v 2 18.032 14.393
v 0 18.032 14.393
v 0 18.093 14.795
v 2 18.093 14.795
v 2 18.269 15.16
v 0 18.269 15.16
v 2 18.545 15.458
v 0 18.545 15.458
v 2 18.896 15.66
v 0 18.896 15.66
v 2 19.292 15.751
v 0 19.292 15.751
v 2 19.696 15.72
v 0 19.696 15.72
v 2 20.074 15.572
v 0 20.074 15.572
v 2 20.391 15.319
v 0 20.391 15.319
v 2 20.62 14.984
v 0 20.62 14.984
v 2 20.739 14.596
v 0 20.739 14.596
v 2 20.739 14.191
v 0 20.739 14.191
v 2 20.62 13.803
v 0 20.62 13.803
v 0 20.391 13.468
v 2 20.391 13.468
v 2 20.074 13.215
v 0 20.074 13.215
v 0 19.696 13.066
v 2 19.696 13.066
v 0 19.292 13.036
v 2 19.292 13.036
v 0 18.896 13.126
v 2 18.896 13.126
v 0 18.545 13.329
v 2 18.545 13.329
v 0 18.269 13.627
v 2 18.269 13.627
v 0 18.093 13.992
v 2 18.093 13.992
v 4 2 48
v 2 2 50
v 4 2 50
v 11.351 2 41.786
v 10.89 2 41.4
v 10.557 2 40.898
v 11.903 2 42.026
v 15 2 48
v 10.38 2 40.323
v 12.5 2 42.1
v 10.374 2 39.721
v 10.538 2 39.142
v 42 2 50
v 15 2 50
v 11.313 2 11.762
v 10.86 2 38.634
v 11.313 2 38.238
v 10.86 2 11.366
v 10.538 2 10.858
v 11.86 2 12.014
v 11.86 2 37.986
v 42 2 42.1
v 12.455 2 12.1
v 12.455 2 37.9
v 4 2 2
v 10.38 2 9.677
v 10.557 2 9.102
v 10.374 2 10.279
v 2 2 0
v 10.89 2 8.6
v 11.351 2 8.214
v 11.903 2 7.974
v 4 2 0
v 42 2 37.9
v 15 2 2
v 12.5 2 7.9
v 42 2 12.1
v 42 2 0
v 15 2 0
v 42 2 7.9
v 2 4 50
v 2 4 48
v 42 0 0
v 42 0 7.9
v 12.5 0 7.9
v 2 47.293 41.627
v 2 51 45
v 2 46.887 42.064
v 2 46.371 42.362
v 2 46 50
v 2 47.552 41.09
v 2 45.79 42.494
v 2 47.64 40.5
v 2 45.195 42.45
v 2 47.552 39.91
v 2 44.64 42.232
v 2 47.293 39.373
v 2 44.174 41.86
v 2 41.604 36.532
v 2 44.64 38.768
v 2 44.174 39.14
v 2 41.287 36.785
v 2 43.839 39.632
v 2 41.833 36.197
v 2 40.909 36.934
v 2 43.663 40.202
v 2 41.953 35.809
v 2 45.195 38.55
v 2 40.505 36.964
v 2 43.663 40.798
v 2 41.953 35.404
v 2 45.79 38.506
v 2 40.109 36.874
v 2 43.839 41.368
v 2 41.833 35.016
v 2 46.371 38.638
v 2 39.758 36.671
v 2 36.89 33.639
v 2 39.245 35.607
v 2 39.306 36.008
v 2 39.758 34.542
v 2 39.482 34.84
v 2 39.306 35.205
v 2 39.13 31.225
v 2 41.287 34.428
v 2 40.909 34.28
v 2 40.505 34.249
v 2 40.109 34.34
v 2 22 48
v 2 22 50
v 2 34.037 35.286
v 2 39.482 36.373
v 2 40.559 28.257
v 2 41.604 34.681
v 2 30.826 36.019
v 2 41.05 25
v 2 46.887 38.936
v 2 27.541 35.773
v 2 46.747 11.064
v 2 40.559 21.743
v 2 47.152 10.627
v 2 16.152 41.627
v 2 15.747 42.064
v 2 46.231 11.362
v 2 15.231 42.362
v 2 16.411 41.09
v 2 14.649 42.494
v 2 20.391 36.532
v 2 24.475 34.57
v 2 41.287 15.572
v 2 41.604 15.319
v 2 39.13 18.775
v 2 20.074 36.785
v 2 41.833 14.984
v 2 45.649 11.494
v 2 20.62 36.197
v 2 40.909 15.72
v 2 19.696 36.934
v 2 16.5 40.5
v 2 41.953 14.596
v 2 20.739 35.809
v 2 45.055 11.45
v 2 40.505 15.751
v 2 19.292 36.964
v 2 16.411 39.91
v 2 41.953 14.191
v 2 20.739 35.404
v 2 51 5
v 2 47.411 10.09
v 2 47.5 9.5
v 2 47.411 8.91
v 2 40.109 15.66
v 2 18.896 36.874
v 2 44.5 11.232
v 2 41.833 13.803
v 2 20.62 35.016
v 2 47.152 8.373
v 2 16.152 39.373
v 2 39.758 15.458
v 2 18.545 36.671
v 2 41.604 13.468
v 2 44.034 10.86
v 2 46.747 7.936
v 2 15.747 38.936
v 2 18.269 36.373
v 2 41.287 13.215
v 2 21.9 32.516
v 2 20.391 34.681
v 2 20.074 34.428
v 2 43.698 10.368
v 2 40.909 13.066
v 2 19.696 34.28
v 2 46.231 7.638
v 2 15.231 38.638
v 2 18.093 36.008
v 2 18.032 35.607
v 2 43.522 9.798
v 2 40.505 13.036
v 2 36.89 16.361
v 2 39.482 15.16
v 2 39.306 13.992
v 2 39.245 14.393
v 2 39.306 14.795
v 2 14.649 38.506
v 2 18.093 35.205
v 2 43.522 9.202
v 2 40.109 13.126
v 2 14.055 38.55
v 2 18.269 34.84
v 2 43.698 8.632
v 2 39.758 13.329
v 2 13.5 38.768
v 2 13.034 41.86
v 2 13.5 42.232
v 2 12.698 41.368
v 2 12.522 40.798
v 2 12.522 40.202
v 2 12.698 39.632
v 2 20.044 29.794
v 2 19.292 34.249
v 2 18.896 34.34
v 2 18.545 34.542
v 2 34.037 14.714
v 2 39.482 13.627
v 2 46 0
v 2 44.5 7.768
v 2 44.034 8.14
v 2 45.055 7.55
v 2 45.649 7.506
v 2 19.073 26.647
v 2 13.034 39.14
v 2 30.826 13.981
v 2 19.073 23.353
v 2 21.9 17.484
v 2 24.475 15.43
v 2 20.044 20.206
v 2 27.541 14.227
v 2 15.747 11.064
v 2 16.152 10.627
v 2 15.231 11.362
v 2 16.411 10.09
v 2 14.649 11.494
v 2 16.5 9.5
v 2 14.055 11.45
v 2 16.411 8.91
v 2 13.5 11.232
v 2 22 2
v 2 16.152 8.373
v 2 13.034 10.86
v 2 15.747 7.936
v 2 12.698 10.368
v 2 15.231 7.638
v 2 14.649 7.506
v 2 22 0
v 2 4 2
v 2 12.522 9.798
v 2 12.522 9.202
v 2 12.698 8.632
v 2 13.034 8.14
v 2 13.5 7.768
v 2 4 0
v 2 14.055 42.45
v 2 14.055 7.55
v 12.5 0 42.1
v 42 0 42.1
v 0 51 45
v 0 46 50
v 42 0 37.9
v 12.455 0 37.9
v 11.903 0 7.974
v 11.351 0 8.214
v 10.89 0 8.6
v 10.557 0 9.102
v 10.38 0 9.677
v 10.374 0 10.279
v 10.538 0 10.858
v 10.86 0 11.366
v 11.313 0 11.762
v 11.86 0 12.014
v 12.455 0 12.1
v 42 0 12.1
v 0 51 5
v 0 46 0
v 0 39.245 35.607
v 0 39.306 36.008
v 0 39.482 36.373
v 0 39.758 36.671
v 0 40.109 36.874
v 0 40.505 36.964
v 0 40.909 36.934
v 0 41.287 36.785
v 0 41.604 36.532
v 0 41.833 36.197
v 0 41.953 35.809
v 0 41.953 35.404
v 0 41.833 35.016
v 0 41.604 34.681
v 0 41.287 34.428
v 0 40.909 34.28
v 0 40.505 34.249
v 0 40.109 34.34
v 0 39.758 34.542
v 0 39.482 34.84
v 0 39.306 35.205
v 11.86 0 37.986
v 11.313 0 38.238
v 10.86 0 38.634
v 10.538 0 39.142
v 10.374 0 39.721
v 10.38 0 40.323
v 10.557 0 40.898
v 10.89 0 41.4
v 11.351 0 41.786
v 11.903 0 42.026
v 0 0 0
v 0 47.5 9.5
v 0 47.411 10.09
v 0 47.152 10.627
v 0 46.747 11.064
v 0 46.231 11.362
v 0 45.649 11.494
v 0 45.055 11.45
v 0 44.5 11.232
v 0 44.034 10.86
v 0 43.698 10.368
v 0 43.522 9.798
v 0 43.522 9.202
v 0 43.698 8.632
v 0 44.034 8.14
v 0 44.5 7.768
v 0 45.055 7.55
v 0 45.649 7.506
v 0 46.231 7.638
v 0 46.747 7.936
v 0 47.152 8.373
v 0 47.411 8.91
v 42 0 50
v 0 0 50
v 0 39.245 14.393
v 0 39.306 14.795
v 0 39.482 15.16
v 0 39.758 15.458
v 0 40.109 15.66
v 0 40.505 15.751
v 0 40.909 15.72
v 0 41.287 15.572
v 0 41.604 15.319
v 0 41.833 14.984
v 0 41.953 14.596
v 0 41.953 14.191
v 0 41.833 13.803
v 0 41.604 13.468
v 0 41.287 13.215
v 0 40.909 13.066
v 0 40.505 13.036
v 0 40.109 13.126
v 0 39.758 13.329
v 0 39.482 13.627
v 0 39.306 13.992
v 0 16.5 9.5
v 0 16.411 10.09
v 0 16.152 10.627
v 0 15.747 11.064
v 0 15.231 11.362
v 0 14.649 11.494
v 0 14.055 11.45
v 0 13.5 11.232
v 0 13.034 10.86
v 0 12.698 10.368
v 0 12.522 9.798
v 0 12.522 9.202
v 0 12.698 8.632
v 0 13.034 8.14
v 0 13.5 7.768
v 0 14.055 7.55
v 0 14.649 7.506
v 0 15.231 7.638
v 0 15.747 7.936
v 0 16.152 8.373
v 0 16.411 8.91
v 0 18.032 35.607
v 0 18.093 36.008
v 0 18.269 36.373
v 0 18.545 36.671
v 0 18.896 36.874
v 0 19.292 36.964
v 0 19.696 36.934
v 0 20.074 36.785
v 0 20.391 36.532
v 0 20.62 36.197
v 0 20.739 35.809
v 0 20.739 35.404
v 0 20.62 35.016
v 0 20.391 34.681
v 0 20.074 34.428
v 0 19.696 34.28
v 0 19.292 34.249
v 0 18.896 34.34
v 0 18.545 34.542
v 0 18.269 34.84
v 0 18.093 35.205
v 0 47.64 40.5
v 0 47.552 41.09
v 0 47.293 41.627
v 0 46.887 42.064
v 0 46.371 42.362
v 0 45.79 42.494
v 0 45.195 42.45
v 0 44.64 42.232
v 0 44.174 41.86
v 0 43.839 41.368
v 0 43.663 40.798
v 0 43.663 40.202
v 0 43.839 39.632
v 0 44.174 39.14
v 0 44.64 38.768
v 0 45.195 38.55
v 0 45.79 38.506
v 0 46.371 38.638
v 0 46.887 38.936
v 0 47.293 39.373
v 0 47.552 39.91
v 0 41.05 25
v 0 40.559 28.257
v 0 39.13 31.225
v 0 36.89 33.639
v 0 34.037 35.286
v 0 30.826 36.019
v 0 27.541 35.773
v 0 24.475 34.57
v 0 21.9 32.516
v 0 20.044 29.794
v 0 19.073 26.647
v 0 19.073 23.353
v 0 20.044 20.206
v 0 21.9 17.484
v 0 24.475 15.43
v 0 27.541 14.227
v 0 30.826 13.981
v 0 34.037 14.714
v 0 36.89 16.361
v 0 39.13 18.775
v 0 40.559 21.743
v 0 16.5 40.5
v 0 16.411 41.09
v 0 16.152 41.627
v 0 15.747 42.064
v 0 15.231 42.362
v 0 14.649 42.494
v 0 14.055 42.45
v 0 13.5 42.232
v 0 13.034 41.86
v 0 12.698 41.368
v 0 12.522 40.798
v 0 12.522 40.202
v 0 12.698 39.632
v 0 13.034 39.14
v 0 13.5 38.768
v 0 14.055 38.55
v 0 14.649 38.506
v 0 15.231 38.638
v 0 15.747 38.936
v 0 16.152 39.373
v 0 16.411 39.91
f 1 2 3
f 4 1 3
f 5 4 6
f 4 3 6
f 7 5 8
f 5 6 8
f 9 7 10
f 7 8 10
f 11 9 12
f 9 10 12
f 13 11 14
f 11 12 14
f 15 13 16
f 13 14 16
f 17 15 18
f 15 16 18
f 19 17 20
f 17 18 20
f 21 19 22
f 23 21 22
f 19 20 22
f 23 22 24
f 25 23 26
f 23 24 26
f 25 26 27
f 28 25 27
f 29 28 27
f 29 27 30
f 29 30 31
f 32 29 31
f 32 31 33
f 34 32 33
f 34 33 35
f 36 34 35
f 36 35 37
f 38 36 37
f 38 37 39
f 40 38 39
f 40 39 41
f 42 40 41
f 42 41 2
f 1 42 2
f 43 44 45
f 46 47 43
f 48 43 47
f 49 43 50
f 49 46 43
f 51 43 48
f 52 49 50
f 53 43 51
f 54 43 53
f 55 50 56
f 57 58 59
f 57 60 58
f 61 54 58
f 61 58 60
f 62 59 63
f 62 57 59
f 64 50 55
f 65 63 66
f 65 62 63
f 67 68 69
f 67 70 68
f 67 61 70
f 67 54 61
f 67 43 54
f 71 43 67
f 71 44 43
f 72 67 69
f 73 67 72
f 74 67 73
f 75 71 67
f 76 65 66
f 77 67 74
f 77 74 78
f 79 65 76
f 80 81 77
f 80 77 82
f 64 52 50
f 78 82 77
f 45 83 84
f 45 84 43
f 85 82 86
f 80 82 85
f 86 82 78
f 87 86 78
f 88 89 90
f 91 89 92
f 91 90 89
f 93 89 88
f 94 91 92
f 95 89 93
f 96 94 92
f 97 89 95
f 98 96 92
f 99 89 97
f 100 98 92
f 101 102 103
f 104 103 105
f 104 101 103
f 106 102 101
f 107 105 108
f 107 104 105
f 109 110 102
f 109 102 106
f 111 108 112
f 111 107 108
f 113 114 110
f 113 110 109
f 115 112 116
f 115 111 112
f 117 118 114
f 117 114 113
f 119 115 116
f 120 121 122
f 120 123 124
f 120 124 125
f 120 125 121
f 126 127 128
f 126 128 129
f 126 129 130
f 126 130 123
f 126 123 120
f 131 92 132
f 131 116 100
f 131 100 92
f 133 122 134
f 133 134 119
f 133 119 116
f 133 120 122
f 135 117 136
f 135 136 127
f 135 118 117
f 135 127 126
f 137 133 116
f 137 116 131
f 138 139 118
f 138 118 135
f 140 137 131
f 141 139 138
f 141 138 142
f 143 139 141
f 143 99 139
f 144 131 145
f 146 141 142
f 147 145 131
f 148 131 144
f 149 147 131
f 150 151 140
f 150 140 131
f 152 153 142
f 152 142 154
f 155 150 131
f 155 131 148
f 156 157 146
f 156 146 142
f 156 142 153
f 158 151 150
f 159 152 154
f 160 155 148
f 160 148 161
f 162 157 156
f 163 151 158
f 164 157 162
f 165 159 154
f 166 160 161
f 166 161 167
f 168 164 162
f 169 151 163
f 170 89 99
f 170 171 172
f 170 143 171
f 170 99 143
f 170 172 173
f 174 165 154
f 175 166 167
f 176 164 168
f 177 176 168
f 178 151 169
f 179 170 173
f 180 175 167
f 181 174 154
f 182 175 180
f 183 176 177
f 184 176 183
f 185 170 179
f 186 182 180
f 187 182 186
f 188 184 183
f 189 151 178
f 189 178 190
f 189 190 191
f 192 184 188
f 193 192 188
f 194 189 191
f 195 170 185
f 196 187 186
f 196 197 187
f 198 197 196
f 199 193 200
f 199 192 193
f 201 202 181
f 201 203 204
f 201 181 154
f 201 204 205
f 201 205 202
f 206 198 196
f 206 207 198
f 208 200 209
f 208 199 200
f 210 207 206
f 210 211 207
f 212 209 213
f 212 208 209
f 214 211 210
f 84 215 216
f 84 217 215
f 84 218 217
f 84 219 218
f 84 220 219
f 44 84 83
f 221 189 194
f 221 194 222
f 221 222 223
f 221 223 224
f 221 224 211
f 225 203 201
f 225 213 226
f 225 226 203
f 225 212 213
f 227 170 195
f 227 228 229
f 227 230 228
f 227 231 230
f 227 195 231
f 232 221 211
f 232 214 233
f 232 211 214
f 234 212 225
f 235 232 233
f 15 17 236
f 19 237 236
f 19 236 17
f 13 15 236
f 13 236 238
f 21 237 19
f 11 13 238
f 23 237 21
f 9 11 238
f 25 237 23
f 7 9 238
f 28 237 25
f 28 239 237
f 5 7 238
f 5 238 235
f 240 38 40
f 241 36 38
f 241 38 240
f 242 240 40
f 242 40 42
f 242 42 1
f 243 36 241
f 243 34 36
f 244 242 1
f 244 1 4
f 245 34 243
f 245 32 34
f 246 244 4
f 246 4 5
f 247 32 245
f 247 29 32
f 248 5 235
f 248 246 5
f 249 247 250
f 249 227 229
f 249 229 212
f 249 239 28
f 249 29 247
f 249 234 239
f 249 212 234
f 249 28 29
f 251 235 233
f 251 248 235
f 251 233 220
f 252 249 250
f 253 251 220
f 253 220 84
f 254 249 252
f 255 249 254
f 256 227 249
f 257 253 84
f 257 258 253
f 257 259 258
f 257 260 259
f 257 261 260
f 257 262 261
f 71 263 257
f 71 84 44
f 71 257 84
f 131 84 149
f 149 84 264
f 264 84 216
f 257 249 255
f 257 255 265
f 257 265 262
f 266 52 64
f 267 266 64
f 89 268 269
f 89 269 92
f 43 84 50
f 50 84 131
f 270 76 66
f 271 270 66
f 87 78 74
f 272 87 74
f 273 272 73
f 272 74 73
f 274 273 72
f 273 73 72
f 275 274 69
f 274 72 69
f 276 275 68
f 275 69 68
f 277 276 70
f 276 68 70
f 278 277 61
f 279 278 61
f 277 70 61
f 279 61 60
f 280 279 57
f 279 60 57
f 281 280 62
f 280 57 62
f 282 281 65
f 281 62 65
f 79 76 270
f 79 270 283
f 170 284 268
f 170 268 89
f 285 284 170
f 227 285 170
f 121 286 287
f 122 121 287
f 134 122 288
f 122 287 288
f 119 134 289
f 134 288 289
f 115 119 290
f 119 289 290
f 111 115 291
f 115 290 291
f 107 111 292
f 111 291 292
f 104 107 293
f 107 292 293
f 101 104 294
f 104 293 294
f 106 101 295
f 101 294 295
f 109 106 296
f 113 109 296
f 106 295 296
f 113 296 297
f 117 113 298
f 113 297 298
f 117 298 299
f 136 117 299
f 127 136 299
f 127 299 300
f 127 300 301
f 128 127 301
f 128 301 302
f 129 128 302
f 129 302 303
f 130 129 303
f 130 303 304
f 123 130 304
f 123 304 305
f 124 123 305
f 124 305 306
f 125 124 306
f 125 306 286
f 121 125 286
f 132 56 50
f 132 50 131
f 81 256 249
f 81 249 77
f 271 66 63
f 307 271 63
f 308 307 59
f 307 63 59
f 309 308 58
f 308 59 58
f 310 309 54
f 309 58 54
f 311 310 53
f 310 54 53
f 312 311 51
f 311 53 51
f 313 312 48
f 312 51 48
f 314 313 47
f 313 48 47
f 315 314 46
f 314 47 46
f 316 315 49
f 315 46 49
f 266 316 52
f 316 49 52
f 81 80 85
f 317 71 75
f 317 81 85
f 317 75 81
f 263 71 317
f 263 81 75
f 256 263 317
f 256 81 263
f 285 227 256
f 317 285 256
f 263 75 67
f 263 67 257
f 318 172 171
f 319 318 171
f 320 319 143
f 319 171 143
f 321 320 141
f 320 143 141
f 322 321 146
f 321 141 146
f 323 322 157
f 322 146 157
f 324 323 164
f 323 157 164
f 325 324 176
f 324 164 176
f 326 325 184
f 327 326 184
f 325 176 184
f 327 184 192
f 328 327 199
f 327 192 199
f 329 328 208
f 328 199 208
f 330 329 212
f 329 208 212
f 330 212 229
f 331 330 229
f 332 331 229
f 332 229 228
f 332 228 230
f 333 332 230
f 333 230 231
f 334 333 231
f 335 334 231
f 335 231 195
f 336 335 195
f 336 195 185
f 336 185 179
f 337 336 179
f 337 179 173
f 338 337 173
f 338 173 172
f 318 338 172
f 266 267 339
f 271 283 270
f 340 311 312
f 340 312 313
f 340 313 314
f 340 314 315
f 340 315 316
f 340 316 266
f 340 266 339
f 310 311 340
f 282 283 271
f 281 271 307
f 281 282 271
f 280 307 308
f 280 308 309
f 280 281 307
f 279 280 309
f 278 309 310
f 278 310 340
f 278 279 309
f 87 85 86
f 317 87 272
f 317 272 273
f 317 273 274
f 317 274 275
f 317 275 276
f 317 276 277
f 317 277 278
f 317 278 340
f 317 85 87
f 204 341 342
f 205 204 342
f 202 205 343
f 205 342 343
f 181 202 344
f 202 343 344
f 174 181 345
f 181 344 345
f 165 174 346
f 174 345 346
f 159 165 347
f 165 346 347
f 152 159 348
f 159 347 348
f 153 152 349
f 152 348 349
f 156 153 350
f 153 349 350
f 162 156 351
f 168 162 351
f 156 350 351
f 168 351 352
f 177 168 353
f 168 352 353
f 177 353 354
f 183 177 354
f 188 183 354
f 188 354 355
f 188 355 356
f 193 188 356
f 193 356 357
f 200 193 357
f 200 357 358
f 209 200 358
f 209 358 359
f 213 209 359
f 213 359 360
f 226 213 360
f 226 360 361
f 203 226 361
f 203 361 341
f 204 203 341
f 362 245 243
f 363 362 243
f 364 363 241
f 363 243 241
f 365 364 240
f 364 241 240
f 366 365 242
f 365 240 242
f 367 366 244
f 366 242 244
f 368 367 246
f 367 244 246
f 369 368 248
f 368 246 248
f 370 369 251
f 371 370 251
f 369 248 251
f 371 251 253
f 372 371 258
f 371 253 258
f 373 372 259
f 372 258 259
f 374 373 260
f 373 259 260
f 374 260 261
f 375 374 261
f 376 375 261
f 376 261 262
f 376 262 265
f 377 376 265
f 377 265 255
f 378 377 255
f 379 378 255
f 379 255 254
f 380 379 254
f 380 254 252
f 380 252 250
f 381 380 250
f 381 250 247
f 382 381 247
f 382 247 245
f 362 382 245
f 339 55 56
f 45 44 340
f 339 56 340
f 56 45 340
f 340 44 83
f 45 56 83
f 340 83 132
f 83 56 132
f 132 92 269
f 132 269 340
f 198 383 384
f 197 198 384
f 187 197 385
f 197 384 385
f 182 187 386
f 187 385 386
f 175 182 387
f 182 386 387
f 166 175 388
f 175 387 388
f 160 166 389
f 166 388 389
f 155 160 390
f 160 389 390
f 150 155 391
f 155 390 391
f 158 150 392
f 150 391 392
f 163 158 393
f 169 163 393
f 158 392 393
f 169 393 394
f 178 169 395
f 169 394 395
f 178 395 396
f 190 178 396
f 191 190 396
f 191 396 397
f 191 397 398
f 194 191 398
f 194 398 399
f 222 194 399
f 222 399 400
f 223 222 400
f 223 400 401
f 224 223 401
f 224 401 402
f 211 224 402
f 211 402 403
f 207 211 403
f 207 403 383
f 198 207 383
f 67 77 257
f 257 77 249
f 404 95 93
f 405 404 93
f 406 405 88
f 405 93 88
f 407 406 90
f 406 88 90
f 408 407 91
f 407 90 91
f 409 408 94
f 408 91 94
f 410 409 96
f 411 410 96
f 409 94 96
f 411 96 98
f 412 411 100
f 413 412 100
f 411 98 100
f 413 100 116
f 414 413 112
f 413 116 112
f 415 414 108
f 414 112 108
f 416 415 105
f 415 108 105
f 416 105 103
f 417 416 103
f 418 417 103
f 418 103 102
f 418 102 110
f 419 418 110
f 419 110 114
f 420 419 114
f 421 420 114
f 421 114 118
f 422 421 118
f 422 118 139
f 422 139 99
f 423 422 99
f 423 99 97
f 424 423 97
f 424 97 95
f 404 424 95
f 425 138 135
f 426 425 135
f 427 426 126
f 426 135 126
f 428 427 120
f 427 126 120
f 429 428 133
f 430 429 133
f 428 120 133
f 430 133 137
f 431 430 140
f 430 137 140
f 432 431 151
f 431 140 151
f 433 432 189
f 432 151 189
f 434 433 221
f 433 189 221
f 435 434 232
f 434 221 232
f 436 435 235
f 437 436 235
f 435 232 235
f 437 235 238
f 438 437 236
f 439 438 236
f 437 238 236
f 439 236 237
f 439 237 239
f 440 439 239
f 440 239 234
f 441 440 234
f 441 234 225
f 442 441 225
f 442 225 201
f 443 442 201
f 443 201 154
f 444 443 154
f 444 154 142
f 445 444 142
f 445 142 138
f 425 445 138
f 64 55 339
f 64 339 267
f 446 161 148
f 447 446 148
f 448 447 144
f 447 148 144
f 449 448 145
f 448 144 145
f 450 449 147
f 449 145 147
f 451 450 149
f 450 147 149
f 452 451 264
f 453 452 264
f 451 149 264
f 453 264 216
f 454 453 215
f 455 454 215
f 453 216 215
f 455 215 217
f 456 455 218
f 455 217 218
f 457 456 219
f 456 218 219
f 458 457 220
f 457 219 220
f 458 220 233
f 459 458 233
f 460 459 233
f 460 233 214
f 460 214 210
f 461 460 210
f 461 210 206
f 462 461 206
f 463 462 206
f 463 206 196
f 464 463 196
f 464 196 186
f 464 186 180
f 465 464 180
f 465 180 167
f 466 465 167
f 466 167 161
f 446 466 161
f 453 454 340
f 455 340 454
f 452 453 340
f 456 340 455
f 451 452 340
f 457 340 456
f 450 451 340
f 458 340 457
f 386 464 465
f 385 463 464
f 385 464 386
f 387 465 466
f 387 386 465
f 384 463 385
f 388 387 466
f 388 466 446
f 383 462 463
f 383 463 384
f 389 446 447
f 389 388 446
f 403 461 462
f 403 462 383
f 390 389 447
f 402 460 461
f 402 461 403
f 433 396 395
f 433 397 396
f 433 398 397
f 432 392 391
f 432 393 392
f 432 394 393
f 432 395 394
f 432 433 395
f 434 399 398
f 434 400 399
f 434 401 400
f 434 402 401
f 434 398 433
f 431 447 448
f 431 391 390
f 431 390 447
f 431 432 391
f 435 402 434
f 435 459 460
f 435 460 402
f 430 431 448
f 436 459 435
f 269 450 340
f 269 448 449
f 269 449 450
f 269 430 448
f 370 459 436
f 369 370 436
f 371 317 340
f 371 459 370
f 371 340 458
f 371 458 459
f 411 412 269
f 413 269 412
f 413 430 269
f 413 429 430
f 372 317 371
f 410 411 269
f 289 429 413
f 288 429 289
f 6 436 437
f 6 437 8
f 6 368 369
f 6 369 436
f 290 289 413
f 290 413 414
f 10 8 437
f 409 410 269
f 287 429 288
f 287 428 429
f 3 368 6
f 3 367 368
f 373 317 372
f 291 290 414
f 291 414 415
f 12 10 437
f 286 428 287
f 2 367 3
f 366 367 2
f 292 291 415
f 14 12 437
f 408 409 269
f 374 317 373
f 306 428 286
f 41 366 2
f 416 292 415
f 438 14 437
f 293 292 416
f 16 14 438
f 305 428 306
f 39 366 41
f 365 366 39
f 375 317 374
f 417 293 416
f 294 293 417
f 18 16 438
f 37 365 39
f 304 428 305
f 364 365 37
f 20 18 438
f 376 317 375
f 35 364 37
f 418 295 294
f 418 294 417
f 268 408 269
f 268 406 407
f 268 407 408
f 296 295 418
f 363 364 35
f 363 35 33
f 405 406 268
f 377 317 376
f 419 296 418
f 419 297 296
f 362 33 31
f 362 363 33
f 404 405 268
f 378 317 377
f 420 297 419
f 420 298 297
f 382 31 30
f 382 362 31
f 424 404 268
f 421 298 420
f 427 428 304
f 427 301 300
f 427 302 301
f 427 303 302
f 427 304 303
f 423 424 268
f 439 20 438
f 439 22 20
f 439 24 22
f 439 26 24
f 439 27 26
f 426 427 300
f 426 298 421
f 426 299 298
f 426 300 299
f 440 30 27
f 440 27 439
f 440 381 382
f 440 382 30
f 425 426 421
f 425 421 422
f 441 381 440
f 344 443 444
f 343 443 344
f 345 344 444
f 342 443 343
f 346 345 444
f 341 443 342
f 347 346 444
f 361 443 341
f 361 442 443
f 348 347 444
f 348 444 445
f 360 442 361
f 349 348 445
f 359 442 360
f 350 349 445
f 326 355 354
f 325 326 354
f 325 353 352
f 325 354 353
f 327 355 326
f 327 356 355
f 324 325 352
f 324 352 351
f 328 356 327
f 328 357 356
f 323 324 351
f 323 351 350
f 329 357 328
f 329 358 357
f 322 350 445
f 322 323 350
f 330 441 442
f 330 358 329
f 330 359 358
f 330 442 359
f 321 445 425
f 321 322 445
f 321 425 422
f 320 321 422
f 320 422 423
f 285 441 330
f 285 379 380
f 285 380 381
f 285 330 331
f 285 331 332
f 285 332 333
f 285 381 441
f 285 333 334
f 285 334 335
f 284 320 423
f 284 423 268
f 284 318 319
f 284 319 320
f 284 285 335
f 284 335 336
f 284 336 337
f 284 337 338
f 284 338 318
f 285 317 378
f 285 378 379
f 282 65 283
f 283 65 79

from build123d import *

# Parameters (mm, degrees)
BOSS_EXTRUDE1_DEPTH = 50
SKETCH2_R           = 11.05
SKETCH2_R_2         = 2
CUT_EXTRUDE1_DEPTH  = 88.761039192
CUT_EXTRUDE2_DEPTH  = 50
BOSS_EXTRUDE2_DEPTH = 2
BOSS_EXTRUDE3_DEPTH = 2
CHAMFER1_SIZE       = 5
SKETCH8_R           = 1.3611534
CUT_EXTRUDE3_DEPTH  = 10
SKETCH9_W           = 26.186270306
SKETCH9_H           = 50
CUT_EXTRUDE4_DEPTH  = 10


with BuildPart() as part:
    # Sketch1 → Boss-Extrude1 (new body)
    with BuildSketch(Plane.XY):
        Polygon((0, 0), (0, 51), (2, 51), (2, 2), (53, 2), (53, 0), align=None)
    extrude(amount=BOSS_EXTRUDE1_DEPTH)

    # Sketch2 → Cut-Extrude1 (cut, through all)
    with BuildSketch(Plane(origin=(2, 0, 0), x_dir=(0, 0, -1), z_dir=(1, 0, 0))):
        with Locations(Location((-25, 30, 0), (0, 0, 90))):
            Circle(SKETCH2_R)
        with Locations(Location((-40.5, 45.640445987, 0), (0, 0, 90))):
            Circle(SKETCH2_R_2)
        with Locations(Location((-9.5, 45.5, 0), (0, 0, 90))):
            Circle(SKETCH2_R_2)
        with Locations(Location((-40.5, 14.5, 0), (0, 0, 90))):
            Circle(SKETCH2_R_2)
        with Locations(Location((-9.5, 14.5, 0), (0, 0, 90))):
            Circle(SKETCH2_R_2)
    extrude(amount=-CUT_EXTRUDE1_DEPTH, mode=Mode.SUBTRACT)

    # Sketch3 → Cut-Extrude2 (cut)
    with BuildSketch(Plane(origin=(0, 2, 0), x_dir=(1, 0, 0), z_dir=(0, 1, 0))):
        with BuildLine():
            Line((12.455251015, -12.1), (42.544748985, -12.1))
            ThreePointArc((42.544748985, -12.1), (44.644629774, -9.977624237), (42.5, -7.900476833))
            Line((42.5, -7.900476833), (12.5, -7.900476833))
            ThreePointArc((12.5, -7.900476833), (10.355370226, -9.977624237), (12.455251015, -12.1))
        make_face()
        with BuildLine():
            Line((12.5, -42.099523167), (42.5, -42.099523167))
            ThreePointArc((42.5, -42.099523167), (44.644629774, -40.022375763), (42.544748985, -37.9))
            Line((42.544748985, -37.9), (12.455251015, -37.9))
            ThreePointArc((12.455251015, -37.9), (10.355370226, -40.022375763), (12.5, -42.099523167))
        make_face()
    extrude(amount=-CUT_EXTRUDE2_DEPTH, mode=Mode.SUBTRACT)

    # Sketch5 → Boss-Extrude2 (add)
    with BuildSketch(Plane.XY.offset(50)):
        Polygon((2, 22), (2, 4), (4, 2), (15, 2), align=None)
    extrude(amount=-BOSS_EXTRUDE2_DEPTH)

    # Sketch6 → Boss-Extrude3 (add)
    with BuildSketch(Plane(origin=(0, 0, 0), x_dir=(-1, 0, 0), z_dir=(0, 0, -1))):
        Polygon((-4, 2), (-2, 4), (-2, 22), (-15, 2), align=None)
    extrude(amount=-BOSS_EXTRUDE3_DEPTH)

    # Chamfer1
    chamfer1_edges = [part.edges().sort_by_distance(p)[0] for p in [
        (1, 51, 50),
        (1, 51, 0),
        (53, 1, 50),
        (53, 1, 0),
    ]]
    chamfer(chamfer1_edges, length=CHAMFER1_SIZE)

    # Sketch8 → Cut-Extrude3 (cut)
    with BuildSketch(Plane.ZY):
        with Locations(Location((35.606601718, 19.393398282, 0), (0, 0, 270))):
            Circle(SKETCH8_R)
        with Locations(Location((14.393398282, 19.393398282, 0), (0, 0, 270))):
            Circle(SKETCH8_R)
        with Locations(Location((14.393398282, 40.606601718, 0), (0, 0, 270))):
            Circle(SKETCH8_R)
        with Locations(Location((35.606601718, 40.606601718, 0), (0, 0, 270))):
            Circle(SKETCH8_R)
    extrude(amount=-CUT_EXTRUDE3_DEPTH, mode=Mode.SUBTRACT)

    # Sketch9 → Cut-Extrude4 (cut)
    with BuildSketch(Plane(origin=(0, 2, 0), x_dir=(1, 0, 0), z_dir=(0, 1, 0))):
        with Locations((55.093135153, -25)):
            Rectangle(SKETCH9_W, SKETCH9_H)
    extrude(amount=-CUT_EXTRUDE4_DEPTH, mode=Mode.SUBTRACT)


solid = part.part
